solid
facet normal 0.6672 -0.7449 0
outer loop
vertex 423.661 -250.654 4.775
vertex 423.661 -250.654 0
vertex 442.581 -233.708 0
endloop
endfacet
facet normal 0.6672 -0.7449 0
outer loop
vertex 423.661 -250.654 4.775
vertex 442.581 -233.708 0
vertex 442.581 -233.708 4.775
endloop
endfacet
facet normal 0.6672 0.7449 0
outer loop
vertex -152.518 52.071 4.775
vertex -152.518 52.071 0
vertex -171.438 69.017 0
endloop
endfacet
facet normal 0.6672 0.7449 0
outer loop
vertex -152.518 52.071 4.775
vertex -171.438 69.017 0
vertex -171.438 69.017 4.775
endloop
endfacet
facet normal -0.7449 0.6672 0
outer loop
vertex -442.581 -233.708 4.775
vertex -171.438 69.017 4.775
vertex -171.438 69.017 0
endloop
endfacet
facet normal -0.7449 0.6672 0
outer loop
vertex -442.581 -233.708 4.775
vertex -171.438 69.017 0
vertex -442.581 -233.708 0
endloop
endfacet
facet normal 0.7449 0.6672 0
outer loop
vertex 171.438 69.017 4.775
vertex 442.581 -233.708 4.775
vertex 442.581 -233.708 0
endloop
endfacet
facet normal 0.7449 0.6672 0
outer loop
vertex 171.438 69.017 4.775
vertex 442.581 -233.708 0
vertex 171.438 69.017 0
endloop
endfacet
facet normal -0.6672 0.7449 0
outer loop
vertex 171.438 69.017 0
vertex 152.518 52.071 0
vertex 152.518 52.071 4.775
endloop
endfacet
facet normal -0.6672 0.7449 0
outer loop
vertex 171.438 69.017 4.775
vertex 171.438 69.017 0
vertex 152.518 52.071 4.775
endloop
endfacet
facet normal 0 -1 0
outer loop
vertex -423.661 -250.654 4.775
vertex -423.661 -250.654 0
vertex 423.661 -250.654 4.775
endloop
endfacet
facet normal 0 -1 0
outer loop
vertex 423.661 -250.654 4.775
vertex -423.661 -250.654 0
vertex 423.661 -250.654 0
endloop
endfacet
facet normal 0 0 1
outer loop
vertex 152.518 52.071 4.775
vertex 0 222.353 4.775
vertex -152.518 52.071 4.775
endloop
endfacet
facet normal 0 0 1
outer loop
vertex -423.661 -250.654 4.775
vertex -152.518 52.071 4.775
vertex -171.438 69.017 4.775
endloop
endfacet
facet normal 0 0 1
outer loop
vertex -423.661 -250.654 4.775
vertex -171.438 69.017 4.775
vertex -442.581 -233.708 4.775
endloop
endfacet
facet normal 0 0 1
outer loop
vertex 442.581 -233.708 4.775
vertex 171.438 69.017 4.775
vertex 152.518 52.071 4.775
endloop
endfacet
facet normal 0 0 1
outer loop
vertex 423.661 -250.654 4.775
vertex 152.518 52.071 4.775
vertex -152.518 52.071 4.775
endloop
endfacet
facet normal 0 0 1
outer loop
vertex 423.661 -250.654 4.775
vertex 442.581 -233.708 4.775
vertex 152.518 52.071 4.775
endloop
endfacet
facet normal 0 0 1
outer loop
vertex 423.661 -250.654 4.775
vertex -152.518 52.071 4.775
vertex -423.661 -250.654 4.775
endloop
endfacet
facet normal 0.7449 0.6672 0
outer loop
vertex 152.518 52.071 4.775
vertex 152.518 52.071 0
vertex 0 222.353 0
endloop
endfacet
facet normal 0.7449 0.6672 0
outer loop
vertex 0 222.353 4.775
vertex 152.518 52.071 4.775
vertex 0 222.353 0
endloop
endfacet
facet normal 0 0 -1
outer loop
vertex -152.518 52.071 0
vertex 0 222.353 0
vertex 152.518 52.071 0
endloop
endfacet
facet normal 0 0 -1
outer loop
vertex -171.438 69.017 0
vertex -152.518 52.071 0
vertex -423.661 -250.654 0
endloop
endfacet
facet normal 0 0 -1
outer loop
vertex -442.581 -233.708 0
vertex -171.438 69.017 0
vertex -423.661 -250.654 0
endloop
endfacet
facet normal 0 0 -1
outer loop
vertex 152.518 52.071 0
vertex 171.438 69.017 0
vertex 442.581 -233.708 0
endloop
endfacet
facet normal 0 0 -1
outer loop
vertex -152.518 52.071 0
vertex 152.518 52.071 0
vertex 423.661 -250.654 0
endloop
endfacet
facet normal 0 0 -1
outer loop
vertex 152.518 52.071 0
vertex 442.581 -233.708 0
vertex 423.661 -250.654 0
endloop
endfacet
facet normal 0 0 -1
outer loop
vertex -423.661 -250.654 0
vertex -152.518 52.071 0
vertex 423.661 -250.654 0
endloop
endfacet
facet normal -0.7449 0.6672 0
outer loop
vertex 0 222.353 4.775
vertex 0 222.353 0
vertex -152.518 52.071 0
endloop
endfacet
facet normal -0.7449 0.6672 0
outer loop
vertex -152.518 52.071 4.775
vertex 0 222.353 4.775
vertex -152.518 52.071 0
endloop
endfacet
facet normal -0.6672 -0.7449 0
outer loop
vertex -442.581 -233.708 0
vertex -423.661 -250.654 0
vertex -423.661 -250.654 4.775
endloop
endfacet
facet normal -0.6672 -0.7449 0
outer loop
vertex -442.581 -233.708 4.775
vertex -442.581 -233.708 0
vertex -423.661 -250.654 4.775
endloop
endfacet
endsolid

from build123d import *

# Parameters (mm, degrees)
F1_DEPTH = 4.7752
F2_W     = 406.4
F2_H     = 4.7752
F3_DEPTH = 25.4
F4_W     = 406.4
F4_H     = 4.7752
F5_DEPTH = 25.4


with BuildPart() as f1:
    # F0 (on Top) → F1 (new body)
    with BuildSketch(Plane.XY):
        Polygon((423.6610569844, -250.6542817955), (0, 222.3534441402), (-423.6610569844, -250.6542817955), align=None)
    extrude(amount=F1_DEPTH)

    # F2 (on face) → F3 (join)
    with BuildSketch(Plane(origin=(110.5053208931, 98.9768210644, 0), x_dir=(-0.6671827669, 0.7448940566, 0), z_dir=(0.7448940566, 0.6671827669, 0))):
        with Locations((-266.1702409973, 2.3876)):
            Rectangle(F2_W, F2_H)
    extrude(amount=F3_DEPTH)

    # F4 (on face) → F5 (join)
    with BuildSketch(Plane(origin=(-110.5053208931, 98.9768210644, 0), x_dir=(-0.6671827669, -0.7448940566, 0), z_dir=(-0.7448940566, 0.6671827669, 0))):
        with Locations((266.1702409973, 2.3876)):
            Rectangle(F4_W, F4_H)
    extrude(amount=F5_DEPTH)


solid = f1.part
